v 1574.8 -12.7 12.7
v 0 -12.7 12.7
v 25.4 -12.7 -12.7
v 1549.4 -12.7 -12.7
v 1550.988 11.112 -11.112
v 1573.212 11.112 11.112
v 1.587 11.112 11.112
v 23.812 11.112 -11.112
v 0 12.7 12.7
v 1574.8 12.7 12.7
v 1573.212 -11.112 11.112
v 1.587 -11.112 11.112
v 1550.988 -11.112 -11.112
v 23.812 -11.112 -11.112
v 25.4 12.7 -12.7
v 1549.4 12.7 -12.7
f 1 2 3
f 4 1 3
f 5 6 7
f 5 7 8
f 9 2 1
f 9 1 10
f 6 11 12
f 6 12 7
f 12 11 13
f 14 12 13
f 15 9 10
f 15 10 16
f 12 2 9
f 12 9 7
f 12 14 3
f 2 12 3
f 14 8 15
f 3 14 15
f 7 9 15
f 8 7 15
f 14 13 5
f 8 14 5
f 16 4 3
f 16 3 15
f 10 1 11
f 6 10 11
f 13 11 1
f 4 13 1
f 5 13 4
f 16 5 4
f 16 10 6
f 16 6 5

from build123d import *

# Parameters (mm, degrees)
SKETCH1_W           = 25.4
SKETCH1_H           = 25.4
SKETCH1_W_2         = 22.225
SKETCH1_H_2         = 22.225
BOSS_EXTRUDE1_DEPTH = 1574.8
CUT_EXTRUDE1_DEPTH  = 1576.056027575


with BuildPart() as part:
    # Sketch1 → Boss-Extrude1 (new body)
    with BuildSketch(Plane(origin=(0, 0, 0), x_dir=(0, 0, -1), z_dir=(1, 0, 0))):
        Rectangle(SKETCH1_W, SKETCH1_H)
        Rectangle(SKETCH1_W_2, SKETCH1_H_2, mode=Mode.SUBTRACT)
    extrude(amount=BOSS_EXTRUDE1_DEPTH)

    # Sketch2 → Cut-Extrude1 (cut, through all)
    with BuildSketch(Plane(origin=(0, 12.7, 0), x_dir=(1, 0, 0), z_dir=(0, 1, 0))):
        Polygon((0, -12.7), (25.4, 12.7), (0, 12.7), align=None)
    cut_extrude1 = extrude(amount=-CUT_EXTRUDE1_DEPTH, mode=Mode.SUBTRACT)

    # Mirror1: Cut-Extrude1 across plane
    add(cut_extrude1.mirror(Plane(origin=(787.4, 0, 0), x_dir=(0, 0, 1), z_dir=(1, 0, 0))), mode=Mode.SUBTRACT)


solid = part.part
